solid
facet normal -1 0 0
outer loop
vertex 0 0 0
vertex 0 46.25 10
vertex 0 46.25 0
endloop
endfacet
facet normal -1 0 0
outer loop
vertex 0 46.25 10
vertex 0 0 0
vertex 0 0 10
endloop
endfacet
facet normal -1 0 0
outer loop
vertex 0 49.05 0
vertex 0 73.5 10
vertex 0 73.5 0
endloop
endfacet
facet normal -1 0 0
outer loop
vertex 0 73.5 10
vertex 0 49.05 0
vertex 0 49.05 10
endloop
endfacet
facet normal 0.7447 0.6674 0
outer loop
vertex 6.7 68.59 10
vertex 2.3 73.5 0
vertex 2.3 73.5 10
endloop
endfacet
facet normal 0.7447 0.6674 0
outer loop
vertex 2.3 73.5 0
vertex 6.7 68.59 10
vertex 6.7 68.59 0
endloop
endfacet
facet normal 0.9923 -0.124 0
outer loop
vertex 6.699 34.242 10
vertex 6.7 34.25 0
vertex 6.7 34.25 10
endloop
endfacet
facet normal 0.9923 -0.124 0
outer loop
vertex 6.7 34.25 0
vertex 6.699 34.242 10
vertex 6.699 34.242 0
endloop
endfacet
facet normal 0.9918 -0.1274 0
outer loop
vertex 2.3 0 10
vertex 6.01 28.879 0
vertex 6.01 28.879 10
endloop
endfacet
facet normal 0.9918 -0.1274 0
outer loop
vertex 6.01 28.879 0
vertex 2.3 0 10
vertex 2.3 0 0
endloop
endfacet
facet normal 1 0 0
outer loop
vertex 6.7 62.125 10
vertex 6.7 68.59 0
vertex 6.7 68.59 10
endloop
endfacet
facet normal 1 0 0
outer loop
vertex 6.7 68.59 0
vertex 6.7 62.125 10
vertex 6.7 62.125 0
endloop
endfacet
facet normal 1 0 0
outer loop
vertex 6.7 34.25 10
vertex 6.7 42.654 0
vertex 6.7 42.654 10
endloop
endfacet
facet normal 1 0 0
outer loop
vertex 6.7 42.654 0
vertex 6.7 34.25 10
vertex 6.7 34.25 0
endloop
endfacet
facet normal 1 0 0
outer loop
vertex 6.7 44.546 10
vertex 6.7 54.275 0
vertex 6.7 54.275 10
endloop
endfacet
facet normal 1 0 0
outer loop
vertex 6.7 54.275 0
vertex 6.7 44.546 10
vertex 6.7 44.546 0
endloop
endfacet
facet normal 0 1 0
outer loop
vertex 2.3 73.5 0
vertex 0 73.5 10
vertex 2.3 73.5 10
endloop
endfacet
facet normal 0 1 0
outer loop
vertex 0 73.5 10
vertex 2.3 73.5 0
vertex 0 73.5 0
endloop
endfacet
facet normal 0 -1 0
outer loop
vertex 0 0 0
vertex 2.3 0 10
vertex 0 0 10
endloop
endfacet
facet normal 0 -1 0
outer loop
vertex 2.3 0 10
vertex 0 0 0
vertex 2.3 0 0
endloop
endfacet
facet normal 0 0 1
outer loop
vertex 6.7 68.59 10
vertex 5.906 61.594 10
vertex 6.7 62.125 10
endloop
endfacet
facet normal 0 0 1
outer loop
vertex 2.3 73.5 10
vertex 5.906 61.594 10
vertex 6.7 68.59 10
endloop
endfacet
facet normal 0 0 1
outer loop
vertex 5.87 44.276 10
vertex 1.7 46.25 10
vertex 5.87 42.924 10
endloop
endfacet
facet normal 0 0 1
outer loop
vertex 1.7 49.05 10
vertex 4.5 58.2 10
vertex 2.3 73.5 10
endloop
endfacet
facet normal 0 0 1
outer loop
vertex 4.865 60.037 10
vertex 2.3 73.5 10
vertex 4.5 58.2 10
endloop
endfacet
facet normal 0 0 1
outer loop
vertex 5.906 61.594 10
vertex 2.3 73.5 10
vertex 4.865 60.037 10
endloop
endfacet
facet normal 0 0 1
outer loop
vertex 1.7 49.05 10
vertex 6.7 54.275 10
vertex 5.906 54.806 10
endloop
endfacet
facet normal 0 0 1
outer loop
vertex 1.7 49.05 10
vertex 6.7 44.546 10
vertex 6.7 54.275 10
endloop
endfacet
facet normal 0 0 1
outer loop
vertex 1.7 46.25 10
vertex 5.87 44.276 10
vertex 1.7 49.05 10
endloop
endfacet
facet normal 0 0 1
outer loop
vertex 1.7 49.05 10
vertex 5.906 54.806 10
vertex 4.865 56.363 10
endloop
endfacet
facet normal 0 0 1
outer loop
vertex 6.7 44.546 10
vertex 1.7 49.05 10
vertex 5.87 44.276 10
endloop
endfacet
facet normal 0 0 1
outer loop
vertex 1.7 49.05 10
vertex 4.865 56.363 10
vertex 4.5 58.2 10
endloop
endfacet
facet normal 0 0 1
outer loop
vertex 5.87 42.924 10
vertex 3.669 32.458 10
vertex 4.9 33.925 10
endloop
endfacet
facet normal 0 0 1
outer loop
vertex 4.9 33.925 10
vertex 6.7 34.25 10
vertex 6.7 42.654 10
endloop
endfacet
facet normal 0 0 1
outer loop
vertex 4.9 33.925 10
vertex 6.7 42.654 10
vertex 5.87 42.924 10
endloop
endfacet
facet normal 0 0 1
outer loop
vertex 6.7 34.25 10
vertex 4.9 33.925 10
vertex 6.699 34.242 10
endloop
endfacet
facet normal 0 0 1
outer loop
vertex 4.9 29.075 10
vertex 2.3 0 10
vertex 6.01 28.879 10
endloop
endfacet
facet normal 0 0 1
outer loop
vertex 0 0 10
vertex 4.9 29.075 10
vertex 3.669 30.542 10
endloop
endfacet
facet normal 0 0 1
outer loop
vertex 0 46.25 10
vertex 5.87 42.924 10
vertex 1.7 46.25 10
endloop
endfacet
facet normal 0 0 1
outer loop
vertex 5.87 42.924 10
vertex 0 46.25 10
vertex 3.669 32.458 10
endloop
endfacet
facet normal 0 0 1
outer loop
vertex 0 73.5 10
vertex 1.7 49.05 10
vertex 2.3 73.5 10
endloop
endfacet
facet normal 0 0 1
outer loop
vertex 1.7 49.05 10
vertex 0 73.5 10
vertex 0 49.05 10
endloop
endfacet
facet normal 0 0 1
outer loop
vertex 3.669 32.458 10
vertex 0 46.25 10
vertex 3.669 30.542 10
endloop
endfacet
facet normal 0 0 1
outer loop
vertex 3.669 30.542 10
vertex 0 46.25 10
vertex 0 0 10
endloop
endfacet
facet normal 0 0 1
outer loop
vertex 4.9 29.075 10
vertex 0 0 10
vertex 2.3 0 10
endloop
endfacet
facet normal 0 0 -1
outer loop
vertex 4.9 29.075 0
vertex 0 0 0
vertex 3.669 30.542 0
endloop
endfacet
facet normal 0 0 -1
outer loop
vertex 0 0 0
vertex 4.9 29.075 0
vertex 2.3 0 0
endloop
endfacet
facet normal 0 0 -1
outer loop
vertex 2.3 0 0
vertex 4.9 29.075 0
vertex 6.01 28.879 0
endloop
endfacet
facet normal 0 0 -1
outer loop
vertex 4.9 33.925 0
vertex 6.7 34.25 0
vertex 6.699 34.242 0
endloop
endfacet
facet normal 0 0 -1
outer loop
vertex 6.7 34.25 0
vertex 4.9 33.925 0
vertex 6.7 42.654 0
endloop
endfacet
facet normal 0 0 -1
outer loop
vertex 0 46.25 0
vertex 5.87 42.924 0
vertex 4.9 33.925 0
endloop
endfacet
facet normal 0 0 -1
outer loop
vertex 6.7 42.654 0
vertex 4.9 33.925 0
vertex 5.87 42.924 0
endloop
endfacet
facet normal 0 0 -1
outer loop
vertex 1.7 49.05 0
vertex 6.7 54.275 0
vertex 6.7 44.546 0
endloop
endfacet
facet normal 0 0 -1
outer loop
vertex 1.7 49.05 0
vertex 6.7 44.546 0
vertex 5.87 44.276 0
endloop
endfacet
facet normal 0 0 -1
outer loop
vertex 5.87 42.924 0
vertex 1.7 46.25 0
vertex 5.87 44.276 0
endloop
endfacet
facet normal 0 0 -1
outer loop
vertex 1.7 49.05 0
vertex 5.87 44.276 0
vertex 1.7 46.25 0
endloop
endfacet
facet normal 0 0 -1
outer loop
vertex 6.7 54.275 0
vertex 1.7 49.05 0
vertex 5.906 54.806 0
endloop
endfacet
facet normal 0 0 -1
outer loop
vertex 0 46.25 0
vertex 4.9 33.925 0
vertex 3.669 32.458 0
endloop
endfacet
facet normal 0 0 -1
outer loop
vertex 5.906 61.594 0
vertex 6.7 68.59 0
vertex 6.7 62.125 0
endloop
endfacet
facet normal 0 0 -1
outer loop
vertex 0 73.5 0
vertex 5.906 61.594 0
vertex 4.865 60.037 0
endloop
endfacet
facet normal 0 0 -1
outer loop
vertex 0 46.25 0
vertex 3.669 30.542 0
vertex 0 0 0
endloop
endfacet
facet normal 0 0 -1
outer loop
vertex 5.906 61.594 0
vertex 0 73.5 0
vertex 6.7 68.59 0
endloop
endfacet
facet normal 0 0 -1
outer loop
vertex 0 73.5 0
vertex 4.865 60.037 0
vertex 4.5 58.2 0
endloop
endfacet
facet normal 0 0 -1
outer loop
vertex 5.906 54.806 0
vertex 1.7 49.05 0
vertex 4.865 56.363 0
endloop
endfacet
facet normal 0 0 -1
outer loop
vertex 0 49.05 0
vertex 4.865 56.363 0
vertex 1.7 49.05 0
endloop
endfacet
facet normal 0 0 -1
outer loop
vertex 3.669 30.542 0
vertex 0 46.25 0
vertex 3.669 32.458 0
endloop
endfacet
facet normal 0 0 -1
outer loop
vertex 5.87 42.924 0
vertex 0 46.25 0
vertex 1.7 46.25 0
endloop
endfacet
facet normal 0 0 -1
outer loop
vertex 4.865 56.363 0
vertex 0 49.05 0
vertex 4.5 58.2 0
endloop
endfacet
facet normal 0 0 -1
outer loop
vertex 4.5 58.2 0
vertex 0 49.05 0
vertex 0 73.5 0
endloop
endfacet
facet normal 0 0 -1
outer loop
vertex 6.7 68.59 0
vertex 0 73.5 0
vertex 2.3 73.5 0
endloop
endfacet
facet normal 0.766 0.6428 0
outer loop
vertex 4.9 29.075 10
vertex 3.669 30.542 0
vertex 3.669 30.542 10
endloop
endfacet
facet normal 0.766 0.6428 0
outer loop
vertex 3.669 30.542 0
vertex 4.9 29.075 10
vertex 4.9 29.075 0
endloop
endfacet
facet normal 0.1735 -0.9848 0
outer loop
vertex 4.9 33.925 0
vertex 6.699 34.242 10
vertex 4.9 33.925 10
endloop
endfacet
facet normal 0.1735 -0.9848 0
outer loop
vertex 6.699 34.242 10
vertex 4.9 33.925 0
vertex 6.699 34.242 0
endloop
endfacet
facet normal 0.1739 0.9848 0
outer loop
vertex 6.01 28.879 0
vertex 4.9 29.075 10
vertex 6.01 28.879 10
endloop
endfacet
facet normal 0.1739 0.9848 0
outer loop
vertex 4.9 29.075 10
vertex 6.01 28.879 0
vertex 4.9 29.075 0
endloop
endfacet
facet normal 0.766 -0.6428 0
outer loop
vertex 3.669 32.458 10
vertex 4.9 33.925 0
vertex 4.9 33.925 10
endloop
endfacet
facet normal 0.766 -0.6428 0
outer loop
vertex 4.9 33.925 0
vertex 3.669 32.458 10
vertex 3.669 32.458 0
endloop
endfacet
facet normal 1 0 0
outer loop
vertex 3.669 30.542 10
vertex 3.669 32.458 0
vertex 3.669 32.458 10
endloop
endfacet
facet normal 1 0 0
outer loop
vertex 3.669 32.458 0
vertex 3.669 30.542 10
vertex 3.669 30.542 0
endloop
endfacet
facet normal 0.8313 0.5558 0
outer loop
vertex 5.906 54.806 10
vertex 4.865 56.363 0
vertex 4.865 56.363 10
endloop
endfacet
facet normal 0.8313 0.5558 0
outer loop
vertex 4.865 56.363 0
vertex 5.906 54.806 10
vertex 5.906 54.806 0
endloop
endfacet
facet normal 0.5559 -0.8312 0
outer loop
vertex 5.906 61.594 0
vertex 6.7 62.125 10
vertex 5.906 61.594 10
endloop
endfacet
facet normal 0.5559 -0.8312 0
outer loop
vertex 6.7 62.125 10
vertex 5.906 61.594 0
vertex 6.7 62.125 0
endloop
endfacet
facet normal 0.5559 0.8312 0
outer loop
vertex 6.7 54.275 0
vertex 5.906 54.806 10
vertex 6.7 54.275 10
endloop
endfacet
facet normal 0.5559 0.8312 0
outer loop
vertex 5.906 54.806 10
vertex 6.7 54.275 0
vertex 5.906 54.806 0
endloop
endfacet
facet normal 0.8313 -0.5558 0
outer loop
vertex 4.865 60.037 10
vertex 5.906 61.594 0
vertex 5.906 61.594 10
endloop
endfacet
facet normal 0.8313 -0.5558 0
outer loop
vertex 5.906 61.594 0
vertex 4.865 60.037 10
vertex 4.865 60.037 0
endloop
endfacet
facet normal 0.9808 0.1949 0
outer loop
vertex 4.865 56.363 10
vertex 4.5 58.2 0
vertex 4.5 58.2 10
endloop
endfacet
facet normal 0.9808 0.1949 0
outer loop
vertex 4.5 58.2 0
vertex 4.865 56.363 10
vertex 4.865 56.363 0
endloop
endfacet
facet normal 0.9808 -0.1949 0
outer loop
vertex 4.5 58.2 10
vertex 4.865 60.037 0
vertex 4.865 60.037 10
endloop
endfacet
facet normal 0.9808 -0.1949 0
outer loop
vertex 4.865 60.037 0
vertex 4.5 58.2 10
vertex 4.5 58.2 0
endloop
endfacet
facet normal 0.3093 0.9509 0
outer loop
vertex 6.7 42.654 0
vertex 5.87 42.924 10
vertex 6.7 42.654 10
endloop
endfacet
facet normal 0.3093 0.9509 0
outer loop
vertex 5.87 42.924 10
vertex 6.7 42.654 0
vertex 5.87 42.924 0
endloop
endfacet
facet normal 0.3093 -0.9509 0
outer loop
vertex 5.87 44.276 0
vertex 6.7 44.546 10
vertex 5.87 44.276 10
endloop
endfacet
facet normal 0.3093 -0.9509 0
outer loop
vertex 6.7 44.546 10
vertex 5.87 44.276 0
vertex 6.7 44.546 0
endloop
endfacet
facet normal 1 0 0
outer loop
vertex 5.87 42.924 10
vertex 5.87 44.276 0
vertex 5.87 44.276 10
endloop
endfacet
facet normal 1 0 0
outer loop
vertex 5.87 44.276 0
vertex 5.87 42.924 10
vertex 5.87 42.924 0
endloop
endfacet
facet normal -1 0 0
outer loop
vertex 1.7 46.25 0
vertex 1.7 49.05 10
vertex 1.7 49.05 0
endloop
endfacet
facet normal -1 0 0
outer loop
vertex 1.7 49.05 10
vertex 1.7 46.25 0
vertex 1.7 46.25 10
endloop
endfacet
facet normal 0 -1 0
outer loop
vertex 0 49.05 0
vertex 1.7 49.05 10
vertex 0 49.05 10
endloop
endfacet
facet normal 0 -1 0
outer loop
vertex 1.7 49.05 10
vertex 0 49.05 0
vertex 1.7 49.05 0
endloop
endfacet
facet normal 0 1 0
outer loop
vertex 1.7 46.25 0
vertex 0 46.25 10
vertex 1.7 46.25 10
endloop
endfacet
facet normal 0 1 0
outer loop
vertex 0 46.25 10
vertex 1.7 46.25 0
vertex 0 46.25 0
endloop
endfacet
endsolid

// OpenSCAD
//Loguncov Maxim

difference(){
linear_extrude(height=10)
polygon(points=[[0,0],[0,73.5],[2.3,73.5],[6.7,68.59],[6.7,34.25],[2.3,0]],paths=[[0,1,2,3,4,5]]);
translate([6.3,31.5,-2]) cylinder(h = 14, r=2.8);
translate([9.3,58.2,-2]) cylinder(h = 14, r=4.8);
translate([6.8,43.6,-2]) cylinder(h = 14, r=1.15);
translate([0,46.25,-2]) cube([1.7,2.8,14]);
}
